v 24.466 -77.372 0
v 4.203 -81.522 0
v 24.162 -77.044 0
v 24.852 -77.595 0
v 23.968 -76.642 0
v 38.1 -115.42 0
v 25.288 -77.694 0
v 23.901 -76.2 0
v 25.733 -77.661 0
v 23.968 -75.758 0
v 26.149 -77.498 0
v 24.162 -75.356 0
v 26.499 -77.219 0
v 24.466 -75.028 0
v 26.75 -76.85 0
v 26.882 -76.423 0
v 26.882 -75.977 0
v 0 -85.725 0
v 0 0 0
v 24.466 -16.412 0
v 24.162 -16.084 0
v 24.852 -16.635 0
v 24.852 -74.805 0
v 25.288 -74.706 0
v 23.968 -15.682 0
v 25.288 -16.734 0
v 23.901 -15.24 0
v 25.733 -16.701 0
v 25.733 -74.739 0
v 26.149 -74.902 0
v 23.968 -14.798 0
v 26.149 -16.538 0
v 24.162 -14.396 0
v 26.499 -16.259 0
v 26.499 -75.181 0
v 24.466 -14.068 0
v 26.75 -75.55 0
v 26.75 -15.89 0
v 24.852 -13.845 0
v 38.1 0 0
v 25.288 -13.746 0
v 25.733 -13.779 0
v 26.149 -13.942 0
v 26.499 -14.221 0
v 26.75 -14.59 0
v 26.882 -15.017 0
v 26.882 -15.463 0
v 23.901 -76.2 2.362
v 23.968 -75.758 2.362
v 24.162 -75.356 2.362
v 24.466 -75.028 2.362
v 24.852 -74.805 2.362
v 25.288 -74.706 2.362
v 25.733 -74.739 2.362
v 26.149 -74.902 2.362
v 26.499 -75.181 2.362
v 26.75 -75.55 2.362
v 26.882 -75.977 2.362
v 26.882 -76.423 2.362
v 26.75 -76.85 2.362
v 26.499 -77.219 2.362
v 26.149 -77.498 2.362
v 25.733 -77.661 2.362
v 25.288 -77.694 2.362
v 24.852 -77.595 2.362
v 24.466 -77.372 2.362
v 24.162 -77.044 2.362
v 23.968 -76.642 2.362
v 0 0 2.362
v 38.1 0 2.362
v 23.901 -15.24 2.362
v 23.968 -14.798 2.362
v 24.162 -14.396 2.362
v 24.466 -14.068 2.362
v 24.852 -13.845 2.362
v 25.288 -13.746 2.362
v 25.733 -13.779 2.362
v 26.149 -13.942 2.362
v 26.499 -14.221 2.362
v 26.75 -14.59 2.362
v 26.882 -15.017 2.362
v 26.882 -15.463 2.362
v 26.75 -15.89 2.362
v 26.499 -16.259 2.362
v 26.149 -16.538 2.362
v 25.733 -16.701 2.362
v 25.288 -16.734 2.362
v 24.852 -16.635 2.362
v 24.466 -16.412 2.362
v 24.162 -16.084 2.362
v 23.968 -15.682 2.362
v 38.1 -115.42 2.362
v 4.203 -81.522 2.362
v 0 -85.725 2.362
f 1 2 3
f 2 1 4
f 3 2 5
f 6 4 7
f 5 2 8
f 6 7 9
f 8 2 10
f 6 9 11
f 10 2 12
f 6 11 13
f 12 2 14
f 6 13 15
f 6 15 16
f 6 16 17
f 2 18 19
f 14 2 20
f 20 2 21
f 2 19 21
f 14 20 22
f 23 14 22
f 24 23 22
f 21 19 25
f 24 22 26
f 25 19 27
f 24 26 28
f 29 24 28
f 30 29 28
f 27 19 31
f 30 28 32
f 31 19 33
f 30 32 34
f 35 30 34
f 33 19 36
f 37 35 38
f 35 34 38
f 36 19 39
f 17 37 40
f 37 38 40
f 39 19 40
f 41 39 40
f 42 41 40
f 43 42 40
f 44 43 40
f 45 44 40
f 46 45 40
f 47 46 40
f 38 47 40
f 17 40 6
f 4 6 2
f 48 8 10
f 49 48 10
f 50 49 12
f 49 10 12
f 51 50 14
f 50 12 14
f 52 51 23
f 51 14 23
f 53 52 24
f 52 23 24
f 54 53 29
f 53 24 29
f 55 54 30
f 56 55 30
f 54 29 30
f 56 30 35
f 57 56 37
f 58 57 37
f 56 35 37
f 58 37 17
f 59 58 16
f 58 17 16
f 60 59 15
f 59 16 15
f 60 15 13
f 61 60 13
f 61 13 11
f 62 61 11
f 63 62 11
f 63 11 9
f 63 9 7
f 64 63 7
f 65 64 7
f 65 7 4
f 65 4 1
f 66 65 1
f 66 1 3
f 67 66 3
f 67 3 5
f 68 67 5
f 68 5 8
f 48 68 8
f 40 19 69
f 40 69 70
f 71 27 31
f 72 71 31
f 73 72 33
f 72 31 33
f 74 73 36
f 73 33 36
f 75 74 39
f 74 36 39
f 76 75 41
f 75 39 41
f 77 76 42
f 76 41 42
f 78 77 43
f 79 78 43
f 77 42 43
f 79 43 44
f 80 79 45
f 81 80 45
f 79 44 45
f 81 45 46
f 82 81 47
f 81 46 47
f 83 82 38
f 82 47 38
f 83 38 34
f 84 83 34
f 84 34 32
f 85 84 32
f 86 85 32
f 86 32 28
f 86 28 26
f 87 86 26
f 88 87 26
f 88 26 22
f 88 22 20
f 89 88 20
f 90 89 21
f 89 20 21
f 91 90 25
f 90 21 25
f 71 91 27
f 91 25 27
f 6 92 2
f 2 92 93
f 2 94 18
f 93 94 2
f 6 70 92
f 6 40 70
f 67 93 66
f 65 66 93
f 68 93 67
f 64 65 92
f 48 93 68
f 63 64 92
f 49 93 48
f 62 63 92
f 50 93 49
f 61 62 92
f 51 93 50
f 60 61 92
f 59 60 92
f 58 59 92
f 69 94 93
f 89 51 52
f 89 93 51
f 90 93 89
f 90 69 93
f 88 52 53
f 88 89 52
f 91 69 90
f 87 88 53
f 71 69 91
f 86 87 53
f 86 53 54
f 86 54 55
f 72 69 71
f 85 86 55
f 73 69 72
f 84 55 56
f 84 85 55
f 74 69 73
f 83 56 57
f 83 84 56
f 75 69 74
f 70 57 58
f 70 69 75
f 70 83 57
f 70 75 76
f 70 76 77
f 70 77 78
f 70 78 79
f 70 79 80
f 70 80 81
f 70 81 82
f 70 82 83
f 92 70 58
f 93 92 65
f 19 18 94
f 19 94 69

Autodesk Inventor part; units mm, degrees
ref_plane "YZ Plane" through (0, 0, 0) normal (1, 0, 0) x (0, 1, 0)
ref_plane "XZ Plane" through (0, 0, 0) normal (0, 1, 0) x (-1, 0, 0)
ref_plane "XY Plane" through (0, 0, 0) normal (0, 0, 1) x (1, 0, 0)
sketch "Sketch1" plane through (0, 0, 0) normal (0, 0, 1) x (1, 0, 0)
  line L0 (0, 0) -> (38.1, 0)
  line L1 (38.1, 0) -> (38.1, -85.725)
  line L2 (38.1, -85.725) -> (0, -85.725)
  line L3 (0, -85.725) -> (0, 0)
  line L4 (38.1, -85.725) -> (38.1, -123.825)
  line L5 (38.1, -123.825) -> (0, -85.725)
  dimension "d0" = 38.1
  dimension "d1" = 85.725
  dimension "d4" = 38.1
extrude "Extrusion1" add sketch "Sketch1" along normal blind 2.3622 contours L0 L1 L2 L3
extrude "Extrusion2" add sketch "Sketch1" along normal blind 2.3622 contours L2 L4 L5
sketch "Sketch2" plane through (0, 0, 2.3622) normal (0, 0, 1) x (1, 0, 0)
  line L0 (0, -85.725) -> (38.1, -123.825) projected
  line L1 (38.1, -123.825) -> (38.1, 0) projected
  line L2 (38.1, -115.4195) -> (4.2028, -81.5222)
  line L3 (0, -85.725) -> (4.2028, -81.5222)
  line L4 (38.1, -115.4195) -> (38.1, -123.825)
  line L5 (38.1, -123.825) -> (0, -85.725)
  line L6 (0, -85.725) -> (4.2028, -81.5222)
  line L7 (4.2028, -81.5222) -> (38.1, -115.4195)
  line L8 (38.1, -115.4195) -> (38.1, -123.825)
  line L9 (38.1, -123.825) -> (0, -85.725)
  dimension "d7" = 5.9436
extrude "Extrusion3" cut sketch "Sketch2" against normal blind 25.4
sketch "Sketch3" plane through (0, 0, 0) normal (0, 0, -1) x (-1, 0, 0)
  circle A0 centre (-25.4, -15.24) radius 1.4986
  circle A1 centre (-25.4, -76.2) radius 1.4986
  line L0 (0, 0) -> (-38.1, 0) projected
  line L1 (-38.1, 0) -> (-38.1, -115.4195) projected
  dimension "d19" = 2.9972
  dimension "d20" = 2.9972
  dimension "d21" = 15.24
  dimension "d22" = 12.7
  dimension "d23" = 12.7
extrude "Extrusion4" cut sketch "Sketch3" against normal blind 25.4
properties part number "Plate_InnerSide_Poly" material "Polycarbonate, Clear"
